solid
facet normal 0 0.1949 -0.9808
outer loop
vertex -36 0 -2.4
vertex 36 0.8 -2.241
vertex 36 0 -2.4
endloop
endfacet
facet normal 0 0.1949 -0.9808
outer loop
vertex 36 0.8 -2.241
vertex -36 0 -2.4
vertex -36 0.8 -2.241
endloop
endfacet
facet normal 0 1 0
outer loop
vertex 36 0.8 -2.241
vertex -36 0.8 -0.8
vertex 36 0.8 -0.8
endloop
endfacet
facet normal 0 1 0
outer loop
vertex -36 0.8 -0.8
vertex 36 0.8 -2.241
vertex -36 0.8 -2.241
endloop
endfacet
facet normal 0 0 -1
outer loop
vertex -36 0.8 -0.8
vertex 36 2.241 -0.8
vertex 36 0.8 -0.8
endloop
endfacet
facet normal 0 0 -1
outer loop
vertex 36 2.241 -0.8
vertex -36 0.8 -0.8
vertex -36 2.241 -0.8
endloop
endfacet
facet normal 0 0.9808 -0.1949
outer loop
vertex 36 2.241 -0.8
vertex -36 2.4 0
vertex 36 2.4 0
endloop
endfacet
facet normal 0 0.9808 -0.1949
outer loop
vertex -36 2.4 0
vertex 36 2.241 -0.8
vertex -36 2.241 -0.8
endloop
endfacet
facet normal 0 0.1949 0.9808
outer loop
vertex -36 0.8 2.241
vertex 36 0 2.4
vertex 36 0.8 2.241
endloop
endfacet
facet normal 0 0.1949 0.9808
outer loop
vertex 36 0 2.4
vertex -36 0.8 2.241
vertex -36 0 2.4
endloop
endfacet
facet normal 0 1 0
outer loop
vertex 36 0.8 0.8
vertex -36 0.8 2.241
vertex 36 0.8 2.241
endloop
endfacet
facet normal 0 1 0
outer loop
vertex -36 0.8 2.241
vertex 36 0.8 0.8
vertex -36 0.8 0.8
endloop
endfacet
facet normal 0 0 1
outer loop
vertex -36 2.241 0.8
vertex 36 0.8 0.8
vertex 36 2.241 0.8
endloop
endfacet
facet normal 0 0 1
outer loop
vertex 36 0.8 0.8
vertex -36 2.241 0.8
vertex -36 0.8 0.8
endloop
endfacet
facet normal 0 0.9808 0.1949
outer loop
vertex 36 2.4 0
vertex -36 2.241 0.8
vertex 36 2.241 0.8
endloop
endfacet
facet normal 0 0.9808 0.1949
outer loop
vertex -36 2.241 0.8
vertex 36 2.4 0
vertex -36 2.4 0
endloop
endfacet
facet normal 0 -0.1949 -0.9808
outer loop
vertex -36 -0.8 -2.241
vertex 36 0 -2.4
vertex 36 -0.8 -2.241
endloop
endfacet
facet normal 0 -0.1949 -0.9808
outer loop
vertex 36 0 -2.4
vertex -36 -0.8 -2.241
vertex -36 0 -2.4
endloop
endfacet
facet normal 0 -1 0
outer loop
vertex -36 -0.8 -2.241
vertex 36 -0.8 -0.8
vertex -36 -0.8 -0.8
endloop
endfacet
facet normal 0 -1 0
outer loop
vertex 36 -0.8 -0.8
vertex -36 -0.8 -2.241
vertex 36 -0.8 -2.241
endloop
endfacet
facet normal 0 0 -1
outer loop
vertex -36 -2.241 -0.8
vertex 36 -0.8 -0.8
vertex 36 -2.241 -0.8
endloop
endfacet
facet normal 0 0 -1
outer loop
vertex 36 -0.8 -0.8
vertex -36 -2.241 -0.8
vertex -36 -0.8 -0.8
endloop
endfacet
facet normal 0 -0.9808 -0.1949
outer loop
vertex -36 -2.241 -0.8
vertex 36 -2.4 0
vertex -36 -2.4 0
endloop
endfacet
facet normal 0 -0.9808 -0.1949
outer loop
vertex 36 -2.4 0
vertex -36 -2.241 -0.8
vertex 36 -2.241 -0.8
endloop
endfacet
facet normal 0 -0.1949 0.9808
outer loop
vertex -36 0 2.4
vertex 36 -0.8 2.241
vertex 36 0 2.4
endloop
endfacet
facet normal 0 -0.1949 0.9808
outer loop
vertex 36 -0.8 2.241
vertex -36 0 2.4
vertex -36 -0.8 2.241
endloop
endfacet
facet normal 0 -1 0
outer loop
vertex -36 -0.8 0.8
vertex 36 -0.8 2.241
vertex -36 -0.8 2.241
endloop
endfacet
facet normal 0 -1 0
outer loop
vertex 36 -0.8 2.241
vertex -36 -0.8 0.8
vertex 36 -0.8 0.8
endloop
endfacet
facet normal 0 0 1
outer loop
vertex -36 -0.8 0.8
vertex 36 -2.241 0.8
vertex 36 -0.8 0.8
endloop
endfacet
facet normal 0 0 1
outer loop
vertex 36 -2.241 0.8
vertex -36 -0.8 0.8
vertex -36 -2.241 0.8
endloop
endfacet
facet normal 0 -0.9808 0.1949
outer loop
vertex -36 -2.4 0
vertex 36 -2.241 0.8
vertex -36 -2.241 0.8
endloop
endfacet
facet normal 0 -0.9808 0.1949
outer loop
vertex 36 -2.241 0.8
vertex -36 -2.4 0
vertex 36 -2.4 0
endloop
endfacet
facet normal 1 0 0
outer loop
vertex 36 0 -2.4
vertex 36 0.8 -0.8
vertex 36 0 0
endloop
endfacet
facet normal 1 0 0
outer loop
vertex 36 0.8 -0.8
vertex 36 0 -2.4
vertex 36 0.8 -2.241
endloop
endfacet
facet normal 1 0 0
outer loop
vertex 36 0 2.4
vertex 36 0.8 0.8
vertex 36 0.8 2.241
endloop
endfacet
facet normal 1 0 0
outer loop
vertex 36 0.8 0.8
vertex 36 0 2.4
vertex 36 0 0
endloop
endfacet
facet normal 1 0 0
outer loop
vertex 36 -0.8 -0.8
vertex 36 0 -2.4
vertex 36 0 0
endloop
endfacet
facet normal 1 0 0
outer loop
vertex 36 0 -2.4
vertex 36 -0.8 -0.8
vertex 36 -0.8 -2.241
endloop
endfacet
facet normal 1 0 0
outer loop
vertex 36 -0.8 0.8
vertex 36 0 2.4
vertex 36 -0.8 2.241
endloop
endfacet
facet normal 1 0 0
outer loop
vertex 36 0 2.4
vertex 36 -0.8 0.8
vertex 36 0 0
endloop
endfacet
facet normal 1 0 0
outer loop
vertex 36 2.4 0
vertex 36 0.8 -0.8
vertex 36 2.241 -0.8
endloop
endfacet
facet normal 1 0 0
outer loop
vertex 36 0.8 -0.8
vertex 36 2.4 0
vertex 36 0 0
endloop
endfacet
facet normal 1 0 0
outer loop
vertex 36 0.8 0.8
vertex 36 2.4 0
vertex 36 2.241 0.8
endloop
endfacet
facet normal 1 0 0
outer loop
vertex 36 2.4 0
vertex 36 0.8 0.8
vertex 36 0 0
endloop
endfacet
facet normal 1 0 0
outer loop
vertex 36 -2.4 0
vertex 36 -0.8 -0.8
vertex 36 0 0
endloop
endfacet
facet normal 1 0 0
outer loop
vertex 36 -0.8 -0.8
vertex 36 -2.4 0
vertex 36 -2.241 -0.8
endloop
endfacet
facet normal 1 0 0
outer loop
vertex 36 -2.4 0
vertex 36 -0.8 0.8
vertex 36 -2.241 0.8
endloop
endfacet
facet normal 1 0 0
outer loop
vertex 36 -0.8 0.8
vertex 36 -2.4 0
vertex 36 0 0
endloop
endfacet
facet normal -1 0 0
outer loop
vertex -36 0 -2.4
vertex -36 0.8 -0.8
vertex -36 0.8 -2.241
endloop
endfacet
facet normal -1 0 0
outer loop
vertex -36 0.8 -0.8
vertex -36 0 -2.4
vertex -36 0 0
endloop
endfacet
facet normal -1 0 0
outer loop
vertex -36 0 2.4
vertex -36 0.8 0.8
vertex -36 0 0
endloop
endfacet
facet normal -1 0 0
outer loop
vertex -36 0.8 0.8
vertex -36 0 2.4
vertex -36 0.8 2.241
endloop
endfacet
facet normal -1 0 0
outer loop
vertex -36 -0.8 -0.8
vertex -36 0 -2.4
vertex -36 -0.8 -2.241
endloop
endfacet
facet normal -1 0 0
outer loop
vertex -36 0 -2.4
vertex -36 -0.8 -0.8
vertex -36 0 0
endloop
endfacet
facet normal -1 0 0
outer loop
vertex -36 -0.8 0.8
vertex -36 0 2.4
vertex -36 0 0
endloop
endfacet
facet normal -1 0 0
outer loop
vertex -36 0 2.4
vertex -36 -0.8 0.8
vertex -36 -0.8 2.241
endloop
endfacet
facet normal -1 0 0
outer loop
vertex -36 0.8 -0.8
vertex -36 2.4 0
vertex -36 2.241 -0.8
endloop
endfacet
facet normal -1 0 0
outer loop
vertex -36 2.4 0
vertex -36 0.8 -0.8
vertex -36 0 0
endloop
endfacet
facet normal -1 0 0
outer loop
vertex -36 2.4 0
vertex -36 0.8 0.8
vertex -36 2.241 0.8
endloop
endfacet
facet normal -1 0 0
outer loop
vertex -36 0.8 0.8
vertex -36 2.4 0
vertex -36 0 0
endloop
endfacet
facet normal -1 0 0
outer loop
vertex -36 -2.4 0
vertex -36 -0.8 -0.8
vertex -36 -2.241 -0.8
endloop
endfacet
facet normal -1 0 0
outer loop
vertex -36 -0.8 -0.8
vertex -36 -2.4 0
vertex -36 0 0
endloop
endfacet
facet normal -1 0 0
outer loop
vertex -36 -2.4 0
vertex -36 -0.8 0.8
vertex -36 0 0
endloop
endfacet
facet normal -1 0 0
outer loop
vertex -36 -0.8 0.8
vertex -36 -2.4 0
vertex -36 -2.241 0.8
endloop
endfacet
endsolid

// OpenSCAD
// file: ../p/axle.scad
use <../lib.scad>
function ldraw_lib__axle() = [
// 0 Axle
// 0 Name: axle.dat
// 0 Author: James Jessiman
// 0 !LDRAW_ORG Primitive UPDATE 2003-01
// 0 !LICENSE Licensed under CC BY 2.0 and CC BY 4.0 : see CAreadme.txt
// 
// 0 BFC CERTIFY CCW
  [0,"BFC","CERTIFY"],
  [0,"BFC","CCW"],
// 
// 0 !HISTORY 2000-04-23 [sbliss] Added conditional edges along outermost diameters
// 0 !HISTORY 2000-05-07 [PTadmin] Official Update 2000-01
// 0 !HISTORY 2002-11-08 [OrionP] Adjusted fit and precision
// 0 !HISTORY 2003-03-12 [PTadmin] Official Update 2003-01
// 0 !HISTORY 2007-06-24 [PTadmin] Header formatted for Contributor Agreement
// 0 !HISTORY 2008-07-01 [PTadmin] Official Update 2008-01
// 
// 
// 5 24 6 0 0 6 1 0 5.602 0 2 5.602 0 -2
  [5,24,6,0,0,6,1,0,5.602,0,2,5.602,0,-2],
// 5 24 0 0 6 0 1 6 2 0 5.602 -2 0 5.602
  [5,24,0,0,6,0,1,6,2,0,5.602,-2,0,5.602],
// 5 24 -6 0 0 -6 1 0 -5.602 0 -2 -5.602 0 2
  [5,24,-6,0,0,-6,1,0,-5.602,0,-2,-5.602,0,2],
// 5 24 0 0 -6 0 1 -6 -2 0 -5.602 2 0 -5.602
  [5,24,0,0,-6,0,1,-6,-2,0,-5.602,2,0,-5.602],
// 
// 2 24 6 0 0 5.602 0 2
  [2,24,6,0,0,5.602,0,2],
// 2 24 5.602 0 2 2 0 2
  [2,24,5.602,0,2,2,0,2],
// 2 24 2 0 2 2 0 5.602
  [2,24,2,0,2,2,0,5.602],
// 2 24 2 0 5.602 0 0 6
  [2,24,2,0,5.602,0,0,6],
// 2 24 -6 0 0 -5.602 0 2
  [2,24,-6,0,0,-5.602,0,2],
// 2 24 -5.602 0 2 -2 0 2
  [2,24,-5.602,0,2,-2,0,2],
// 2 24 -2 0 2 -2 0 5.602
  [2,24,-2,0,2,-2,0,5.602],
// 2 24 -2 0 5.602 -0 0 6
  [2,24,-2,0,5.602,-0,0,6],
// 2 24 6 0 -0 5.602 0 -2
  [2,24,6,0,-0,5.602,0,-2],
// 2 24 5.602 0 -2 2 0 -2
  [2,24,5.602,0,-2,2,0,-2],
// 2 24 2 0 -2 2 0 -5.602
  [2,24,2,0,-2,2,0,-5.602],
// 2 24 2 0 -5.602 0 0 -6
  [2,24,2,0,-5.602,0,0,-6],
// 2 24 -6 0 -0 -5.602 0 -2
  [2,24,-6,0,-0,-5.602,0,-2],
// 2 24 -5.602 0 -2 -2 0 -2
  [2,24,-5.602,0,-2,-2,0,-2],
// 2 24 -2 0 -2 -2 0 -5.602
  [2,24,-2,0,-2,-2,0,-5.602],
// 2 24 -2 0 -5.602 -0 0 -6
  [2,24,-2,0,-5.602,-0,0,-6],
// 2 24 6 1 0 5.602 1 2
  [2,24,6,1,0,5.602,1,2],
// 2 24 5.602 1 2 2 1 2
  [2,24,5.602,1,2,2,1,2],
// 2 24 2 1 2 2 1 5.602
  [2,24,2,1,2,2,1,5.602],
// 2 24 2 1 5.602 0 1 6
  [2,24,2,1,5.602,0,1,6],
// 2 24 -6 1 0 -5.602 1 2
  [2,24,-6,1,0,-5.602,1,2],
// 2 24 -5.602 1 2 -2 1 2
  [2,24,-5.602,1,2,-2,1,2],
// 2 24 -2 1 2 -2 1 5.602
  [2,24,-2,1,2,-2,1,5.602],
// 2 24 -2 1 5.602 -0 1 6
  [2,24,-2,1,5.602,-0,1,6],
// 2 24 6 1 -0 5.602 1 -2
  [2,24,6,1,-0,5.602,1,-2],
// 2 24 5.602 1 -2 2 1 -2
  [2,24,5.602,1,-2,2,1,-2],
// 2 24 2 1 -2 2 1 -5.602
  [2,24,2,1,-2,2,1,-5.602],
// 2 24 2 1 -5.602 0 1 -6
  [2,24,2,1,-5.602,0,1,-6],
// 2 24 -6 1 -0 -5.602 1 -2
  [2,24,-6,1,-0,-5.602,1,-2],
// 2 24 -5.602 1 -2 -2 1 -2
  [2,24,-5.602,1,-2,-2,1,-2],
// 2 24 -2 1 -2 -2 1 -5.602
  [2,24,-2,1,-2,-2,1,-5.602],
// 2 24 -2 1 -5.602 -0 1 -6
  [2,24,-2,1,-5.602,-0,1,-6],
// 
// 2 24 5.602 0 2 5.602 1 2
  [2,24,5.602,0,2,5.602,1,2],
// 2 24 2 0 2 2 1 2
  [2,24,2,0,2,2,1,2],
// 2 24 2 0 5.602 2 1 5.602
  [2,24,2,0,5.602,2,1,5.602],
// 2 24 -5.602 0 2 -5.602 1 2
  [2,24,-5.602,0,2,-5.602,1,2],
// 2 24 -2 0 2 -2 1 2
  [2,24,-2,0,2,-2,1,2],
// 2 24 -2 0 5.602 -2 1 5.602
  [2,24,-2,0,5.602,-2,1,5.602],
// 2 24 5.602 0 -2 5.602 1 -2
  [2,24,5.602,0,-2,5.602,1,-2],
// 2 24 2 0 -2 2 1 -2
  [2,24,2,0,-2,2,1,-2],
// 2 24 2 0 -5.602 2 1 -5.602
  [2,24,2,0,-5.602,2,1,-5.602],
// 2 24 -5.602 0 -2 -5.602 1 -2
  [2,24,-5.602,0,-2,-5.602,1,-2],
// 2 24 -2 0 -2 -2 1 -2
  [2,24,-2,0,-2,-2,1,-2],
// 2 24 -2 0 -5.602 -2 1 -5.602
  [2,24,-2,0,-5.602,-2,1,-5.602],
// 
// 4 16 6 0 0 6 1 0 5.602 1 2 5.602 0 2
  [4,16,6,0,0,6,1,0,5.602,1,2,5.602,0,2],
// 4 16 5.602 0 2 5.602 1 2 2 1 2 2 0 2
  [4,16,5.602,0,2,5.602,1,2,2,1,2,2,0,2],
// 4 16 2 0 2 2 1 2 2 1 5.602 2 0 5.602
  [4,16,2,0,2,2,1,2,2,1,5.602,2,0,5.602],
// 4 16 2 0 5.602 2 1 5.602 0 1 6 0 0 6
  [4,16,2,0,5.602,2,1,5.602,0,1,6,0,0,6],
// 4 16 -6 0 0 -5.602 0 2 -5.602 1 2 -6 1 0
  [4,16,-6,0,0,-5.602,0,2,-5.602,1,2,-6,1,0],
// 4 16 -5.602 0 2 -2 0 2 -2 1 2 -5.602 1 2
  [4,16,-5.602,0,2,-2,0,2,-2,1,2,-5.602,1,2],
// 4 16 -2 0 2 -2 0 5.602 -2 1 5.602 -2 1 2
  [4,16,-2,0,2,-2,0,5.602,-2,1,5.602,-2,1,2],
// 4 16 -2 0 5.602 -0 0 6 -0 1 6 -2 1 5.602
  [4,16,-2,0,5.602,-0,0,6,-0,1,6,-2,1,5.602],
// 4 16 6 0 -0 5.602 0 -2 5.602 1 -2 6 1 -0
  [4,16,6,0,-0,5.602,0,-2,5.602,1,-2,6,1,-0],
// 4 16 5.602 0 -2 2 0 -2 2 1 -2 5.602 1 -2
  [4,16,5.602,0,-2,2,0,-2,2,1,-2,5.602,1,-2],
// 4 16 2 0 -2 2 0 -5.602 2 1 -5.602 2 1 -2
  [4,16,2,0,-2,2,0,-5.602,2,1,-5.602,2,1,-2],
// 4 16 2 0 -5.602 0 0 -6 0 1 -6 2 1 -5.602
  [4,16,2,0,-5.602,0,0,-6,0,1,-6,2,1,-5.602],
// 4 16 -6 0 -0 -6 1 -0 -5.602 1 -2 -5.602 0 -2
  [4,16,-6,0,-0,-6,1,-0,-5.602,1,-2,-5.602,0,-2],
// 4 16 -5.602 0 -2 -5.602 1 -2 -2 1 -2 -2 0 -2
  [4,16,-5.602,0,-2,-5.602,1,-2,-2,1,-2,-2,0,-2],
// 4 16 -2 0 -2 -2 1 -2 -2 1 -5.602 -2 0 -5.602
  [4,16,-2,0,-2,-2,1,-2,-2,1,-5.602,-2,0,-5.602],
// 4 16 -2 0 -5.602 -2 1 -5.602 -0 1 -6 -0 0 -6
  [4,16,-2,0,-5.602,-2,1,-5.602,-0,1,-6,-0,0,-6],
// 
// 4 16 6 0 0 5.602 0 2 2 0 2 0 0 0
  [4,16,6,0,0,5.602,0,2,2,0,2,0,0,0],
// 4 16 -6 0 0 0 0 0 -2 0 2 -5.602 0 2
  [4,16,-6,0,0,0,0,0,-2,0,2,-5.602,0,2],
// 4 16 6 0 0 0 0 0 2 0 -2 5.602 0 -2
  [4,16,6,0,0,0,0,0,2,0,-2,5.602,0,-2],
// 4 16 -6 0 0 -5.602 0 -2 -2 0 -2 0 0 0
  [4,16,-6,0,0,-5.602,0,-2,-2,0,-2,0,0,0],
// 4 16 0 0 6 0 0 0 2 0 2 2 0 5.602
  [4,16,0,0,6,0,0,0,2,0,2,2,0,5.602],
// 4 16 0 0 6 -2 0 5.602 -2 0 2 0 0 0
  [4,16,0,0,6,-2,0,5.602,-2,0,2,0,0,0],
// 4 16 0 0 -6 2 0 -5.602 2 0 -2 0 0 0
  [4,16,0,0,-6,2,0,-5.602,2,0,-2,0,0,0],
// 4 16 0 0 -6 0 0 0 -2 0 -2 -2 0 -5.602
  [4,16,0,0,-6,0,0,0,-2,0,-2,-2,0,-5.602],
// 4 16 6 1 0 0 1 0 2 1 2 5.602 1 2
  [4,16,6,1,0,0,1,0,2,1,2,5.602,1,2],
// 4 16 -6 1 0 -5.602 1 2 -2 1 2 0 1 0
  [4,16,-6,1,0,-5.602,1,2,-2,1,2,0,1,0],
// 4 16 6 1 0 5.602 1 -2 2 1 -2 0 1 0
  [4,16,6,1,0,5.602,1,-2,2,1,-2,0,1,0],
// 4 16 -6 1 0 0 1 0 -2 1 -2 -5.602 1 -2
  [4,16,-6,1,0,0,1,0,-2,1,-2,-5.602,1,-2],
// 4 16 0 1 6 2 1 5.602 2 1 2 0 1 0
  [4,16,0,1,6,2,1,5.602,2,1,2,0,1,0],
// 4 16 0 1 6 0 1 0 -2 1 2 -2 1 5.602
  [4,16,0,1,6,0,1,0,-2,1,2,-2,1,5.602],
// 4 16 0 1 -6 0 1 0 2 1 -2 2 1 -5.602
  [4,16,0,1,-6,0,1,0,2,1,-2,2,1,-5.602],
// 4 16 0 1 -6 -2 1 -5.602 -2 1 -2 0 1 0
  [4,16,0,1,-6,-2,1,-5.602,-2,1,-2,0,1,0],
// 0
];
makepoly(ldraw_lib__axle(), line=0.2);
// main file
use <../lib.scad>
use <../p/axle.scad>
function ldraw_lib__60485() = [
// 0 Technic Axle  9
// 0 Name: 60485.dat
// 0 Author: Philippe Hurbain [Philo]
// 0 !LDRAW_ORG Part UPDATE 2009-02
// 0 !LICENSE Licensed under CC BY 2.0 and CC BY 4.0 : see CAreadme.txt
// 
// 0 BFC CERTIFY CCW
  [0,"BFC","CERTIFY"],
  [0,"BFC","CCW"],
// 
// 0 !HISTORY 2009-09-03 [PTadmin] Official Update 2009-02
// 
// 
// 1 16 90 0 0 0 -180 0 1 0 0 0 0 1 axle.dat
  [1,16,90,0,0,0,-180,0,1,0,0,0,0,1, ldraw_lib__axle()],
// 0 //
];
makepoly(ldraw_lib__60485(), line=0.2);
